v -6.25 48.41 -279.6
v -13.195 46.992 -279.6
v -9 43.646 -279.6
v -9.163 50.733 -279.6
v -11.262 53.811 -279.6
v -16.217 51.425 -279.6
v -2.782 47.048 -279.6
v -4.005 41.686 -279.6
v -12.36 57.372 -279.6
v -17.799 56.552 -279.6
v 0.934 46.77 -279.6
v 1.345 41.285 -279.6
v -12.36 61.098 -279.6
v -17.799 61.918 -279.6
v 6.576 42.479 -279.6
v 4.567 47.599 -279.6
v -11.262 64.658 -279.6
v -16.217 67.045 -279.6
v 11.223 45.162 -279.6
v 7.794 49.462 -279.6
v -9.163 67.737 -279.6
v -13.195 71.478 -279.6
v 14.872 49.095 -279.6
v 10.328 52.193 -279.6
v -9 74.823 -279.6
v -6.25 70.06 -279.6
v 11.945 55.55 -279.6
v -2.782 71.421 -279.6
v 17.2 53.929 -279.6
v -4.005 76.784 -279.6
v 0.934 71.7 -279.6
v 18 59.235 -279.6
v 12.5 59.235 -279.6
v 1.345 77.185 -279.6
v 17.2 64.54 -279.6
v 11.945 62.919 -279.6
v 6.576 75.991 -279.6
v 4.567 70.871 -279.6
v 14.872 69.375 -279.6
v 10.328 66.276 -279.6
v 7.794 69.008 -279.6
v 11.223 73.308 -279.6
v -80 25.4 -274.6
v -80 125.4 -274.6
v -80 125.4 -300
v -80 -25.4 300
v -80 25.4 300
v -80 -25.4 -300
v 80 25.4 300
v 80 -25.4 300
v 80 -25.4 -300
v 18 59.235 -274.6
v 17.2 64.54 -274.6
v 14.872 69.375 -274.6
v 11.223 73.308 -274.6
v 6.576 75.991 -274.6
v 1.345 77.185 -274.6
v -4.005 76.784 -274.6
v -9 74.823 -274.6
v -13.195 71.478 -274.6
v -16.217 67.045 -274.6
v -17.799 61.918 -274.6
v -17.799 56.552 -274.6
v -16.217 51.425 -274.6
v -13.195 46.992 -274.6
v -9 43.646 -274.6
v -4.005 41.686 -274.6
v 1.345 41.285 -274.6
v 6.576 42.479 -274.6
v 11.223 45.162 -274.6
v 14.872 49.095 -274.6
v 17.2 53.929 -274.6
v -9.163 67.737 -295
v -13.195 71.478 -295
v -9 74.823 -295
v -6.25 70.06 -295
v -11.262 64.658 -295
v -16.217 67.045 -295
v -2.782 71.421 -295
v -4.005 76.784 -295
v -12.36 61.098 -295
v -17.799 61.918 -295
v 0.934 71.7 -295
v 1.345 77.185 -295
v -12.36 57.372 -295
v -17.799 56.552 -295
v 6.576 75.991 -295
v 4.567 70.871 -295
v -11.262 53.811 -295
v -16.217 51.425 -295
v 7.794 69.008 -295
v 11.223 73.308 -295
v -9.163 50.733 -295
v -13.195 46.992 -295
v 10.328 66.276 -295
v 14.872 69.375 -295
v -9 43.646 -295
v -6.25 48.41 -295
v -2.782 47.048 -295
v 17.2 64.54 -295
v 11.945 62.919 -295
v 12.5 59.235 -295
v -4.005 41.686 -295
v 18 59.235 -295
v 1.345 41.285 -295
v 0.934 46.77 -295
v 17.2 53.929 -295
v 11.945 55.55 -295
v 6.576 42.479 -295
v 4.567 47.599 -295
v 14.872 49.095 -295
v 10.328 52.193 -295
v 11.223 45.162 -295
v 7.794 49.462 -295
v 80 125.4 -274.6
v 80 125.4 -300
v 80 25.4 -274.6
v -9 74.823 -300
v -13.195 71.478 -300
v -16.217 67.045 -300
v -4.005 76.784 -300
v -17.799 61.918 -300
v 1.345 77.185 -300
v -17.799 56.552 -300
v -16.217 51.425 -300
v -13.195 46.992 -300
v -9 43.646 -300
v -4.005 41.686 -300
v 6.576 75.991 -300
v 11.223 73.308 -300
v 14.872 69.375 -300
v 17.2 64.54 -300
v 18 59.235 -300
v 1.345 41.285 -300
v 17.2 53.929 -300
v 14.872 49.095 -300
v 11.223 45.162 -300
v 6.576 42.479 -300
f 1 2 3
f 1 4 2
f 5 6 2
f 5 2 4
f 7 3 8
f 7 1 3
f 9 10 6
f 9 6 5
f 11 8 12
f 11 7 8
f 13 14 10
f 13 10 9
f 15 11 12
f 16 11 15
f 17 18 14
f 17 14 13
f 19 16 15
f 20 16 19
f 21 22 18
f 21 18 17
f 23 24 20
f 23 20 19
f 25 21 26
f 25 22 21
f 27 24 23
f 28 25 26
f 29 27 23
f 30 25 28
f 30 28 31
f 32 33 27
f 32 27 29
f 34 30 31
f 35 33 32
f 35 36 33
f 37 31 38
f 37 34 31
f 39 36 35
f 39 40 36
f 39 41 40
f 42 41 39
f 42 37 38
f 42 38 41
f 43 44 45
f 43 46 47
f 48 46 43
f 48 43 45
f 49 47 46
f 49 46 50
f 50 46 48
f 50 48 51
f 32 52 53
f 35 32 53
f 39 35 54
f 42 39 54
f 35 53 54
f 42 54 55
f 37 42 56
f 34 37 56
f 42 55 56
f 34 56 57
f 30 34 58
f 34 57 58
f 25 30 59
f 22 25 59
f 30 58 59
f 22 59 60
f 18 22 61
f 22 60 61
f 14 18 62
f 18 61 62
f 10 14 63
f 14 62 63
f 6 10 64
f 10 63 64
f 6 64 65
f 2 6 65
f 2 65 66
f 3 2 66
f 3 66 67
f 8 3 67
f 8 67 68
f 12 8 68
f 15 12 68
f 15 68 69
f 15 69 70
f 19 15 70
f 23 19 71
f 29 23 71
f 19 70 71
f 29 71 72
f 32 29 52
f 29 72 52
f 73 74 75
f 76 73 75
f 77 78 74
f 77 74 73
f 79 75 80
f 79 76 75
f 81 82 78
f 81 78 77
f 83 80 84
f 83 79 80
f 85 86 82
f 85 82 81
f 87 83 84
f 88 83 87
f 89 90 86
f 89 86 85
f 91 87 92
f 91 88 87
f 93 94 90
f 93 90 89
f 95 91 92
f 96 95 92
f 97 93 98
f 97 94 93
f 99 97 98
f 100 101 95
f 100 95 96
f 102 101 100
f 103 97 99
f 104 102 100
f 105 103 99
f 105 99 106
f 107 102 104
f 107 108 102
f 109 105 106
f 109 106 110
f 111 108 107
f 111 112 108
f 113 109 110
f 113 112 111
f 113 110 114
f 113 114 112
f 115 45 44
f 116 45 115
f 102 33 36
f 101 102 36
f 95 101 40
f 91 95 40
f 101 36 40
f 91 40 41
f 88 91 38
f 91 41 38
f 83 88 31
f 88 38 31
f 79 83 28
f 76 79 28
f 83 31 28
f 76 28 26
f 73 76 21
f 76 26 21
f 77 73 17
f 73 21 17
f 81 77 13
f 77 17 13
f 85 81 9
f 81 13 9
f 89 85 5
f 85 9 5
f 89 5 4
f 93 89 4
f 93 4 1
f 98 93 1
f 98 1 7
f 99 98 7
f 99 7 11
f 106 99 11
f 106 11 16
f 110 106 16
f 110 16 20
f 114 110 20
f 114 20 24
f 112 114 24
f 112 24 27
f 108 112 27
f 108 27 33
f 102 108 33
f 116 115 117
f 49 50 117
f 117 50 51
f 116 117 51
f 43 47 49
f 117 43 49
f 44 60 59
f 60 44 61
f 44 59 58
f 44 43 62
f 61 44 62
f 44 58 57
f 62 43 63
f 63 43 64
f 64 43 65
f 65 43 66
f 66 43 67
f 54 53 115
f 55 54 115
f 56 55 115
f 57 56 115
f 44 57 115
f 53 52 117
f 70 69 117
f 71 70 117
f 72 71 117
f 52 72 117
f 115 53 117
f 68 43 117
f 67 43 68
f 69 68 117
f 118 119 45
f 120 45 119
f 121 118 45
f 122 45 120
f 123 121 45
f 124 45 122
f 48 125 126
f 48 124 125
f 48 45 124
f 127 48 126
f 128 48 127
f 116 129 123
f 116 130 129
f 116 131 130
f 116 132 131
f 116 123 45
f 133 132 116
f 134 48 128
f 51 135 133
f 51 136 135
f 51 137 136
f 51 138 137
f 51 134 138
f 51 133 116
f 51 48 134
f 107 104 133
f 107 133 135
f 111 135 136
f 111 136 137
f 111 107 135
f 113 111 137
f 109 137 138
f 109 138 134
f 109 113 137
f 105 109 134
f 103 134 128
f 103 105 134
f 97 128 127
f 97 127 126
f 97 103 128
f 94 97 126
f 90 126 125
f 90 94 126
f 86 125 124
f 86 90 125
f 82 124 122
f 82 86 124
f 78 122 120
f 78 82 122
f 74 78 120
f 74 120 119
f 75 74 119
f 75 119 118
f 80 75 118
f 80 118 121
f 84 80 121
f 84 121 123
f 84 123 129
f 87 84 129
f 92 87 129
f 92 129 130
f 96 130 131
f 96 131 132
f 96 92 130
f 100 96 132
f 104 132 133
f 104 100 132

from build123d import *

# Parameters (mm, degrees)
CROQUIS1_W              = 160
CROQUIS1_H              = 50.8
SALIENTE_EXTRUIR1_DEPTH = 300
CROQUIS2_W              = 160
CROQUIS2_H              = 25.4
SALIENTE_EXTRUIR2_DEPTH = 100
CROQUIS3_R              = 12.5
CORTAR_EXTRUIR1_DEPTH   = 100
CROQUIS4_R              = 18
CORTAR_EXTRUIR2_DEPTH   = 5
CORTAR_EXTRUIR3_START   = -5
CROQUIS5_R              = 18
CORTAR_EXTRUIR3_DEPTH   = 5


with BuildPart() as part:
    # Croquis1 → Saliente-Extruir1 (new, symmetric)
    with BuildSketch(Plane.XY):
        Rectangle(CROQUIS1_W, CROQUIS1_H)
    extrude(amount=SALIENTE_EXTRUIR1_DEPTH, both=True)

    # Croquis2 → Saliente-Extruir2 (add)
    with BuildSketch(Plane(origin=(0, 25.4, 0), x_dir=(1, 0, 0), z_dir=(0, 1, 0))):
        with Locations((0, 287.3)):
            Rectangle(CROQUIS2_W, CROQUIS2_H)
    extrude(amount=SALIENTE_EXTRUIR2_DEPTH)

    # Croquis3 → Cortar-Extruir1 (cut)
    with BuildSketch(Plane.XY.offset(-274.6)):
        with Locations((0, 59.234859244)):
            Circle(CROQUIS3_R)
    extrude(amount=-CORTAR_EXTRUIR1_DEPTH, mode=Mode.SUBTRACT)

    # Croquis4 → Cortar-Extruir2 (cut)
    with BuildSketch(Plane.XY.offset(-274.6)):
        with Locations((0, 59.234859244)):
            Circle(CROQUIS4_R)
    extrude(amount=-CORTAR_EXTRUIR2_DEPTH, mode=Mode.SUBTRACT)

    # Croquis5 → Cortar-Extruir3 (cut)
    with BuildSketch(Plane(origin=(0, 0, -300), x_dir=(-1, 0, 0), z_dir=(0, 0, -1)).offset(CORTAR_EXTRUIR3_START)):
        with Locations(Location((0, 59.234859244, 0), (0, 0, 180))):
            Circle(CROQUIS5_R)
    extrude(amount=CORTAR_EXTRUIR3_DEPTH, mode=Mode.SUBTRACT)


solid = part.part
